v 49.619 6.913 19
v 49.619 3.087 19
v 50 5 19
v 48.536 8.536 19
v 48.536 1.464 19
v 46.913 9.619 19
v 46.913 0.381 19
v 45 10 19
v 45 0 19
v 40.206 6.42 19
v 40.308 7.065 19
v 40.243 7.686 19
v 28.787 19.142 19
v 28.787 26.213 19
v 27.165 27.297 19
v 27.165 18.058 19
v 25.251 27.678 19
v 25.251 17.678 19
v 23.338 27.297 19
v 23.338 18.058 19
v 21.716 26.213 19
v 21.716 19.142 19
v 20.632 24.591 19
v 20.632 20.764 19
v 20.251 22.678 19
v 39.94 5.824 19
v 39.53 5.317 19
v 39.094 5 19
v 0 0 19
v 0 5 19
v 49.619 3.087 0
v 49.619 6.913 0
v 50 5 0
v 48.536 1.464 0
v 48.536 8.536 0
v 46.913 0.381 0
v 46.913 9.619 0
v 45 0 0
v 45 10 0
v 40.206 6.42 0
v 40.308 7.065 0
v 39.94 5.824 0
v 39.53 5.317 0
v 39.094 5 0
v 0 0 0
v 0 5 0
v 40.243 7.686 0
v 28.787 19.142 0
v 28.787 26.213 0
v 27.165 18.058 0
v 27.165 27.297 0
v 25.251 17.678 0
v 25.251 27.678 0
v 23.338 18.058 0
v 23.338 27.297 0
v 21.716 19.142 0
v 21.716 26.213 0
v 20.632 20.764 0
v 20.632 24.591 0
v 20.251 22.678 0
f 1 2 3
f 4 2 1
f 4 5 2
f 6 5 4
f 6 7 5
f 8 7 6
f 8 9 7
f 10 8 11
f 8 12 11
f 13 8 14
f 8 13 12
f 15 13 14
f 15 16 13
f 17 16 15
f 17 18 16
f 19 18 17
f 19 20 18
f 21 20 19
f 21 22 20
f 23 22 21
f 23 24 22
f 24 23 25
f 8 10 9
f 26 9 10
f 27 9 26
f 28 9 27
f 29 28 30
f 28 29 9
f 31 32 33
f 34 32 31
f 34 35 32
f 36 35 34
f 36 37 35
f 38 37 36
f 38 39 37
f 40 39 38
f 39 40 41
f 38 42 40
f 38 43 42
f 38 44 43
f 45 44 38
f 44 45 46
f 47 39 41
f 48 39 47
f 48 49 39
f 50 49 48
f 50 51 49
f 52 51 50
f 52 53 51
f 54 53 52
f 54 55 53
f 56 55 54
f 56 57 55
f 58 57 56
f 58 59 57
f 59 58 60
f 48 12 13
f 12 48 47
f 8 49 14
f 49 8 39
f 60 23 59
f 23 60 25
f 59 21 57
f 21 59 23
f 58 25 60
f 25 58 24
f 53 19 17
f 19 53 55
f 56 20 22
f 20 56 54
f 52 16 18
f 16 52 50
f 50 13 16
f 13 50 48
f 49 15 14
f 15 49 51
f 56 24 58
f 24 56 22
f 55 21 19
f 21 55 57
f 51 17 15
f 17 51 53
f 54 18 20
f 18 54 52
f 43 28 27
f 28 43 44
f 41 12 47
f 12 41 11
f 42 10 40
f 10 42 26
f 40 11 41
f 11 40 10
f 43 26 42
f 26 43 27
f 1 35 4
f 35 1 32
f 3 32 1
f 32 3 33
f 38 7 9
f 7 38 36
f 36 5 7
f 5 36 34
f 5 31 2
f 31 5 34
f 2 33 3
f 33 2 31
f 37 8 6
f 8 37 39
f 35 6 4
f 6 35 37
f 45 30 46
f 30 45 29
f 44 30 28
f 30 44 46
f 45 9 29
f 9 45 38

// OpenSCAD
// Simple Towel Hook, customizable width
//
// Thought it would be nice if the hook could made
// as wide as the 2 sided tape used to attach it 
// Default width, 19mm
// 

// Desired width in millimeters
width=19;  // [5:100]

cube ([45, 5 , width]);
translate([50,0,0]) 
{
    translate ([0,5,0])
    {
        rotate([0,0,135])
        {
            cube ([30, 5 , width]);
            translate([30,5 ,0])
            {
                cylinder(h=width,r=5);
            }
        }
        translate([-5,0,0])
        {
            cylinder(h=width,r=5);
            rotate([0,0,163.5])
            {
                difference()
                {
                    translate([2 ,-4,])
                    {
                        cube([3.8,8,width]);
                    };
                    translate([7.5,0,0])
                    {
                        $fn=24;
                        cylinder(h=width,d=5); 
                    }
                
                }
                
            }
            
        }
    }
}
